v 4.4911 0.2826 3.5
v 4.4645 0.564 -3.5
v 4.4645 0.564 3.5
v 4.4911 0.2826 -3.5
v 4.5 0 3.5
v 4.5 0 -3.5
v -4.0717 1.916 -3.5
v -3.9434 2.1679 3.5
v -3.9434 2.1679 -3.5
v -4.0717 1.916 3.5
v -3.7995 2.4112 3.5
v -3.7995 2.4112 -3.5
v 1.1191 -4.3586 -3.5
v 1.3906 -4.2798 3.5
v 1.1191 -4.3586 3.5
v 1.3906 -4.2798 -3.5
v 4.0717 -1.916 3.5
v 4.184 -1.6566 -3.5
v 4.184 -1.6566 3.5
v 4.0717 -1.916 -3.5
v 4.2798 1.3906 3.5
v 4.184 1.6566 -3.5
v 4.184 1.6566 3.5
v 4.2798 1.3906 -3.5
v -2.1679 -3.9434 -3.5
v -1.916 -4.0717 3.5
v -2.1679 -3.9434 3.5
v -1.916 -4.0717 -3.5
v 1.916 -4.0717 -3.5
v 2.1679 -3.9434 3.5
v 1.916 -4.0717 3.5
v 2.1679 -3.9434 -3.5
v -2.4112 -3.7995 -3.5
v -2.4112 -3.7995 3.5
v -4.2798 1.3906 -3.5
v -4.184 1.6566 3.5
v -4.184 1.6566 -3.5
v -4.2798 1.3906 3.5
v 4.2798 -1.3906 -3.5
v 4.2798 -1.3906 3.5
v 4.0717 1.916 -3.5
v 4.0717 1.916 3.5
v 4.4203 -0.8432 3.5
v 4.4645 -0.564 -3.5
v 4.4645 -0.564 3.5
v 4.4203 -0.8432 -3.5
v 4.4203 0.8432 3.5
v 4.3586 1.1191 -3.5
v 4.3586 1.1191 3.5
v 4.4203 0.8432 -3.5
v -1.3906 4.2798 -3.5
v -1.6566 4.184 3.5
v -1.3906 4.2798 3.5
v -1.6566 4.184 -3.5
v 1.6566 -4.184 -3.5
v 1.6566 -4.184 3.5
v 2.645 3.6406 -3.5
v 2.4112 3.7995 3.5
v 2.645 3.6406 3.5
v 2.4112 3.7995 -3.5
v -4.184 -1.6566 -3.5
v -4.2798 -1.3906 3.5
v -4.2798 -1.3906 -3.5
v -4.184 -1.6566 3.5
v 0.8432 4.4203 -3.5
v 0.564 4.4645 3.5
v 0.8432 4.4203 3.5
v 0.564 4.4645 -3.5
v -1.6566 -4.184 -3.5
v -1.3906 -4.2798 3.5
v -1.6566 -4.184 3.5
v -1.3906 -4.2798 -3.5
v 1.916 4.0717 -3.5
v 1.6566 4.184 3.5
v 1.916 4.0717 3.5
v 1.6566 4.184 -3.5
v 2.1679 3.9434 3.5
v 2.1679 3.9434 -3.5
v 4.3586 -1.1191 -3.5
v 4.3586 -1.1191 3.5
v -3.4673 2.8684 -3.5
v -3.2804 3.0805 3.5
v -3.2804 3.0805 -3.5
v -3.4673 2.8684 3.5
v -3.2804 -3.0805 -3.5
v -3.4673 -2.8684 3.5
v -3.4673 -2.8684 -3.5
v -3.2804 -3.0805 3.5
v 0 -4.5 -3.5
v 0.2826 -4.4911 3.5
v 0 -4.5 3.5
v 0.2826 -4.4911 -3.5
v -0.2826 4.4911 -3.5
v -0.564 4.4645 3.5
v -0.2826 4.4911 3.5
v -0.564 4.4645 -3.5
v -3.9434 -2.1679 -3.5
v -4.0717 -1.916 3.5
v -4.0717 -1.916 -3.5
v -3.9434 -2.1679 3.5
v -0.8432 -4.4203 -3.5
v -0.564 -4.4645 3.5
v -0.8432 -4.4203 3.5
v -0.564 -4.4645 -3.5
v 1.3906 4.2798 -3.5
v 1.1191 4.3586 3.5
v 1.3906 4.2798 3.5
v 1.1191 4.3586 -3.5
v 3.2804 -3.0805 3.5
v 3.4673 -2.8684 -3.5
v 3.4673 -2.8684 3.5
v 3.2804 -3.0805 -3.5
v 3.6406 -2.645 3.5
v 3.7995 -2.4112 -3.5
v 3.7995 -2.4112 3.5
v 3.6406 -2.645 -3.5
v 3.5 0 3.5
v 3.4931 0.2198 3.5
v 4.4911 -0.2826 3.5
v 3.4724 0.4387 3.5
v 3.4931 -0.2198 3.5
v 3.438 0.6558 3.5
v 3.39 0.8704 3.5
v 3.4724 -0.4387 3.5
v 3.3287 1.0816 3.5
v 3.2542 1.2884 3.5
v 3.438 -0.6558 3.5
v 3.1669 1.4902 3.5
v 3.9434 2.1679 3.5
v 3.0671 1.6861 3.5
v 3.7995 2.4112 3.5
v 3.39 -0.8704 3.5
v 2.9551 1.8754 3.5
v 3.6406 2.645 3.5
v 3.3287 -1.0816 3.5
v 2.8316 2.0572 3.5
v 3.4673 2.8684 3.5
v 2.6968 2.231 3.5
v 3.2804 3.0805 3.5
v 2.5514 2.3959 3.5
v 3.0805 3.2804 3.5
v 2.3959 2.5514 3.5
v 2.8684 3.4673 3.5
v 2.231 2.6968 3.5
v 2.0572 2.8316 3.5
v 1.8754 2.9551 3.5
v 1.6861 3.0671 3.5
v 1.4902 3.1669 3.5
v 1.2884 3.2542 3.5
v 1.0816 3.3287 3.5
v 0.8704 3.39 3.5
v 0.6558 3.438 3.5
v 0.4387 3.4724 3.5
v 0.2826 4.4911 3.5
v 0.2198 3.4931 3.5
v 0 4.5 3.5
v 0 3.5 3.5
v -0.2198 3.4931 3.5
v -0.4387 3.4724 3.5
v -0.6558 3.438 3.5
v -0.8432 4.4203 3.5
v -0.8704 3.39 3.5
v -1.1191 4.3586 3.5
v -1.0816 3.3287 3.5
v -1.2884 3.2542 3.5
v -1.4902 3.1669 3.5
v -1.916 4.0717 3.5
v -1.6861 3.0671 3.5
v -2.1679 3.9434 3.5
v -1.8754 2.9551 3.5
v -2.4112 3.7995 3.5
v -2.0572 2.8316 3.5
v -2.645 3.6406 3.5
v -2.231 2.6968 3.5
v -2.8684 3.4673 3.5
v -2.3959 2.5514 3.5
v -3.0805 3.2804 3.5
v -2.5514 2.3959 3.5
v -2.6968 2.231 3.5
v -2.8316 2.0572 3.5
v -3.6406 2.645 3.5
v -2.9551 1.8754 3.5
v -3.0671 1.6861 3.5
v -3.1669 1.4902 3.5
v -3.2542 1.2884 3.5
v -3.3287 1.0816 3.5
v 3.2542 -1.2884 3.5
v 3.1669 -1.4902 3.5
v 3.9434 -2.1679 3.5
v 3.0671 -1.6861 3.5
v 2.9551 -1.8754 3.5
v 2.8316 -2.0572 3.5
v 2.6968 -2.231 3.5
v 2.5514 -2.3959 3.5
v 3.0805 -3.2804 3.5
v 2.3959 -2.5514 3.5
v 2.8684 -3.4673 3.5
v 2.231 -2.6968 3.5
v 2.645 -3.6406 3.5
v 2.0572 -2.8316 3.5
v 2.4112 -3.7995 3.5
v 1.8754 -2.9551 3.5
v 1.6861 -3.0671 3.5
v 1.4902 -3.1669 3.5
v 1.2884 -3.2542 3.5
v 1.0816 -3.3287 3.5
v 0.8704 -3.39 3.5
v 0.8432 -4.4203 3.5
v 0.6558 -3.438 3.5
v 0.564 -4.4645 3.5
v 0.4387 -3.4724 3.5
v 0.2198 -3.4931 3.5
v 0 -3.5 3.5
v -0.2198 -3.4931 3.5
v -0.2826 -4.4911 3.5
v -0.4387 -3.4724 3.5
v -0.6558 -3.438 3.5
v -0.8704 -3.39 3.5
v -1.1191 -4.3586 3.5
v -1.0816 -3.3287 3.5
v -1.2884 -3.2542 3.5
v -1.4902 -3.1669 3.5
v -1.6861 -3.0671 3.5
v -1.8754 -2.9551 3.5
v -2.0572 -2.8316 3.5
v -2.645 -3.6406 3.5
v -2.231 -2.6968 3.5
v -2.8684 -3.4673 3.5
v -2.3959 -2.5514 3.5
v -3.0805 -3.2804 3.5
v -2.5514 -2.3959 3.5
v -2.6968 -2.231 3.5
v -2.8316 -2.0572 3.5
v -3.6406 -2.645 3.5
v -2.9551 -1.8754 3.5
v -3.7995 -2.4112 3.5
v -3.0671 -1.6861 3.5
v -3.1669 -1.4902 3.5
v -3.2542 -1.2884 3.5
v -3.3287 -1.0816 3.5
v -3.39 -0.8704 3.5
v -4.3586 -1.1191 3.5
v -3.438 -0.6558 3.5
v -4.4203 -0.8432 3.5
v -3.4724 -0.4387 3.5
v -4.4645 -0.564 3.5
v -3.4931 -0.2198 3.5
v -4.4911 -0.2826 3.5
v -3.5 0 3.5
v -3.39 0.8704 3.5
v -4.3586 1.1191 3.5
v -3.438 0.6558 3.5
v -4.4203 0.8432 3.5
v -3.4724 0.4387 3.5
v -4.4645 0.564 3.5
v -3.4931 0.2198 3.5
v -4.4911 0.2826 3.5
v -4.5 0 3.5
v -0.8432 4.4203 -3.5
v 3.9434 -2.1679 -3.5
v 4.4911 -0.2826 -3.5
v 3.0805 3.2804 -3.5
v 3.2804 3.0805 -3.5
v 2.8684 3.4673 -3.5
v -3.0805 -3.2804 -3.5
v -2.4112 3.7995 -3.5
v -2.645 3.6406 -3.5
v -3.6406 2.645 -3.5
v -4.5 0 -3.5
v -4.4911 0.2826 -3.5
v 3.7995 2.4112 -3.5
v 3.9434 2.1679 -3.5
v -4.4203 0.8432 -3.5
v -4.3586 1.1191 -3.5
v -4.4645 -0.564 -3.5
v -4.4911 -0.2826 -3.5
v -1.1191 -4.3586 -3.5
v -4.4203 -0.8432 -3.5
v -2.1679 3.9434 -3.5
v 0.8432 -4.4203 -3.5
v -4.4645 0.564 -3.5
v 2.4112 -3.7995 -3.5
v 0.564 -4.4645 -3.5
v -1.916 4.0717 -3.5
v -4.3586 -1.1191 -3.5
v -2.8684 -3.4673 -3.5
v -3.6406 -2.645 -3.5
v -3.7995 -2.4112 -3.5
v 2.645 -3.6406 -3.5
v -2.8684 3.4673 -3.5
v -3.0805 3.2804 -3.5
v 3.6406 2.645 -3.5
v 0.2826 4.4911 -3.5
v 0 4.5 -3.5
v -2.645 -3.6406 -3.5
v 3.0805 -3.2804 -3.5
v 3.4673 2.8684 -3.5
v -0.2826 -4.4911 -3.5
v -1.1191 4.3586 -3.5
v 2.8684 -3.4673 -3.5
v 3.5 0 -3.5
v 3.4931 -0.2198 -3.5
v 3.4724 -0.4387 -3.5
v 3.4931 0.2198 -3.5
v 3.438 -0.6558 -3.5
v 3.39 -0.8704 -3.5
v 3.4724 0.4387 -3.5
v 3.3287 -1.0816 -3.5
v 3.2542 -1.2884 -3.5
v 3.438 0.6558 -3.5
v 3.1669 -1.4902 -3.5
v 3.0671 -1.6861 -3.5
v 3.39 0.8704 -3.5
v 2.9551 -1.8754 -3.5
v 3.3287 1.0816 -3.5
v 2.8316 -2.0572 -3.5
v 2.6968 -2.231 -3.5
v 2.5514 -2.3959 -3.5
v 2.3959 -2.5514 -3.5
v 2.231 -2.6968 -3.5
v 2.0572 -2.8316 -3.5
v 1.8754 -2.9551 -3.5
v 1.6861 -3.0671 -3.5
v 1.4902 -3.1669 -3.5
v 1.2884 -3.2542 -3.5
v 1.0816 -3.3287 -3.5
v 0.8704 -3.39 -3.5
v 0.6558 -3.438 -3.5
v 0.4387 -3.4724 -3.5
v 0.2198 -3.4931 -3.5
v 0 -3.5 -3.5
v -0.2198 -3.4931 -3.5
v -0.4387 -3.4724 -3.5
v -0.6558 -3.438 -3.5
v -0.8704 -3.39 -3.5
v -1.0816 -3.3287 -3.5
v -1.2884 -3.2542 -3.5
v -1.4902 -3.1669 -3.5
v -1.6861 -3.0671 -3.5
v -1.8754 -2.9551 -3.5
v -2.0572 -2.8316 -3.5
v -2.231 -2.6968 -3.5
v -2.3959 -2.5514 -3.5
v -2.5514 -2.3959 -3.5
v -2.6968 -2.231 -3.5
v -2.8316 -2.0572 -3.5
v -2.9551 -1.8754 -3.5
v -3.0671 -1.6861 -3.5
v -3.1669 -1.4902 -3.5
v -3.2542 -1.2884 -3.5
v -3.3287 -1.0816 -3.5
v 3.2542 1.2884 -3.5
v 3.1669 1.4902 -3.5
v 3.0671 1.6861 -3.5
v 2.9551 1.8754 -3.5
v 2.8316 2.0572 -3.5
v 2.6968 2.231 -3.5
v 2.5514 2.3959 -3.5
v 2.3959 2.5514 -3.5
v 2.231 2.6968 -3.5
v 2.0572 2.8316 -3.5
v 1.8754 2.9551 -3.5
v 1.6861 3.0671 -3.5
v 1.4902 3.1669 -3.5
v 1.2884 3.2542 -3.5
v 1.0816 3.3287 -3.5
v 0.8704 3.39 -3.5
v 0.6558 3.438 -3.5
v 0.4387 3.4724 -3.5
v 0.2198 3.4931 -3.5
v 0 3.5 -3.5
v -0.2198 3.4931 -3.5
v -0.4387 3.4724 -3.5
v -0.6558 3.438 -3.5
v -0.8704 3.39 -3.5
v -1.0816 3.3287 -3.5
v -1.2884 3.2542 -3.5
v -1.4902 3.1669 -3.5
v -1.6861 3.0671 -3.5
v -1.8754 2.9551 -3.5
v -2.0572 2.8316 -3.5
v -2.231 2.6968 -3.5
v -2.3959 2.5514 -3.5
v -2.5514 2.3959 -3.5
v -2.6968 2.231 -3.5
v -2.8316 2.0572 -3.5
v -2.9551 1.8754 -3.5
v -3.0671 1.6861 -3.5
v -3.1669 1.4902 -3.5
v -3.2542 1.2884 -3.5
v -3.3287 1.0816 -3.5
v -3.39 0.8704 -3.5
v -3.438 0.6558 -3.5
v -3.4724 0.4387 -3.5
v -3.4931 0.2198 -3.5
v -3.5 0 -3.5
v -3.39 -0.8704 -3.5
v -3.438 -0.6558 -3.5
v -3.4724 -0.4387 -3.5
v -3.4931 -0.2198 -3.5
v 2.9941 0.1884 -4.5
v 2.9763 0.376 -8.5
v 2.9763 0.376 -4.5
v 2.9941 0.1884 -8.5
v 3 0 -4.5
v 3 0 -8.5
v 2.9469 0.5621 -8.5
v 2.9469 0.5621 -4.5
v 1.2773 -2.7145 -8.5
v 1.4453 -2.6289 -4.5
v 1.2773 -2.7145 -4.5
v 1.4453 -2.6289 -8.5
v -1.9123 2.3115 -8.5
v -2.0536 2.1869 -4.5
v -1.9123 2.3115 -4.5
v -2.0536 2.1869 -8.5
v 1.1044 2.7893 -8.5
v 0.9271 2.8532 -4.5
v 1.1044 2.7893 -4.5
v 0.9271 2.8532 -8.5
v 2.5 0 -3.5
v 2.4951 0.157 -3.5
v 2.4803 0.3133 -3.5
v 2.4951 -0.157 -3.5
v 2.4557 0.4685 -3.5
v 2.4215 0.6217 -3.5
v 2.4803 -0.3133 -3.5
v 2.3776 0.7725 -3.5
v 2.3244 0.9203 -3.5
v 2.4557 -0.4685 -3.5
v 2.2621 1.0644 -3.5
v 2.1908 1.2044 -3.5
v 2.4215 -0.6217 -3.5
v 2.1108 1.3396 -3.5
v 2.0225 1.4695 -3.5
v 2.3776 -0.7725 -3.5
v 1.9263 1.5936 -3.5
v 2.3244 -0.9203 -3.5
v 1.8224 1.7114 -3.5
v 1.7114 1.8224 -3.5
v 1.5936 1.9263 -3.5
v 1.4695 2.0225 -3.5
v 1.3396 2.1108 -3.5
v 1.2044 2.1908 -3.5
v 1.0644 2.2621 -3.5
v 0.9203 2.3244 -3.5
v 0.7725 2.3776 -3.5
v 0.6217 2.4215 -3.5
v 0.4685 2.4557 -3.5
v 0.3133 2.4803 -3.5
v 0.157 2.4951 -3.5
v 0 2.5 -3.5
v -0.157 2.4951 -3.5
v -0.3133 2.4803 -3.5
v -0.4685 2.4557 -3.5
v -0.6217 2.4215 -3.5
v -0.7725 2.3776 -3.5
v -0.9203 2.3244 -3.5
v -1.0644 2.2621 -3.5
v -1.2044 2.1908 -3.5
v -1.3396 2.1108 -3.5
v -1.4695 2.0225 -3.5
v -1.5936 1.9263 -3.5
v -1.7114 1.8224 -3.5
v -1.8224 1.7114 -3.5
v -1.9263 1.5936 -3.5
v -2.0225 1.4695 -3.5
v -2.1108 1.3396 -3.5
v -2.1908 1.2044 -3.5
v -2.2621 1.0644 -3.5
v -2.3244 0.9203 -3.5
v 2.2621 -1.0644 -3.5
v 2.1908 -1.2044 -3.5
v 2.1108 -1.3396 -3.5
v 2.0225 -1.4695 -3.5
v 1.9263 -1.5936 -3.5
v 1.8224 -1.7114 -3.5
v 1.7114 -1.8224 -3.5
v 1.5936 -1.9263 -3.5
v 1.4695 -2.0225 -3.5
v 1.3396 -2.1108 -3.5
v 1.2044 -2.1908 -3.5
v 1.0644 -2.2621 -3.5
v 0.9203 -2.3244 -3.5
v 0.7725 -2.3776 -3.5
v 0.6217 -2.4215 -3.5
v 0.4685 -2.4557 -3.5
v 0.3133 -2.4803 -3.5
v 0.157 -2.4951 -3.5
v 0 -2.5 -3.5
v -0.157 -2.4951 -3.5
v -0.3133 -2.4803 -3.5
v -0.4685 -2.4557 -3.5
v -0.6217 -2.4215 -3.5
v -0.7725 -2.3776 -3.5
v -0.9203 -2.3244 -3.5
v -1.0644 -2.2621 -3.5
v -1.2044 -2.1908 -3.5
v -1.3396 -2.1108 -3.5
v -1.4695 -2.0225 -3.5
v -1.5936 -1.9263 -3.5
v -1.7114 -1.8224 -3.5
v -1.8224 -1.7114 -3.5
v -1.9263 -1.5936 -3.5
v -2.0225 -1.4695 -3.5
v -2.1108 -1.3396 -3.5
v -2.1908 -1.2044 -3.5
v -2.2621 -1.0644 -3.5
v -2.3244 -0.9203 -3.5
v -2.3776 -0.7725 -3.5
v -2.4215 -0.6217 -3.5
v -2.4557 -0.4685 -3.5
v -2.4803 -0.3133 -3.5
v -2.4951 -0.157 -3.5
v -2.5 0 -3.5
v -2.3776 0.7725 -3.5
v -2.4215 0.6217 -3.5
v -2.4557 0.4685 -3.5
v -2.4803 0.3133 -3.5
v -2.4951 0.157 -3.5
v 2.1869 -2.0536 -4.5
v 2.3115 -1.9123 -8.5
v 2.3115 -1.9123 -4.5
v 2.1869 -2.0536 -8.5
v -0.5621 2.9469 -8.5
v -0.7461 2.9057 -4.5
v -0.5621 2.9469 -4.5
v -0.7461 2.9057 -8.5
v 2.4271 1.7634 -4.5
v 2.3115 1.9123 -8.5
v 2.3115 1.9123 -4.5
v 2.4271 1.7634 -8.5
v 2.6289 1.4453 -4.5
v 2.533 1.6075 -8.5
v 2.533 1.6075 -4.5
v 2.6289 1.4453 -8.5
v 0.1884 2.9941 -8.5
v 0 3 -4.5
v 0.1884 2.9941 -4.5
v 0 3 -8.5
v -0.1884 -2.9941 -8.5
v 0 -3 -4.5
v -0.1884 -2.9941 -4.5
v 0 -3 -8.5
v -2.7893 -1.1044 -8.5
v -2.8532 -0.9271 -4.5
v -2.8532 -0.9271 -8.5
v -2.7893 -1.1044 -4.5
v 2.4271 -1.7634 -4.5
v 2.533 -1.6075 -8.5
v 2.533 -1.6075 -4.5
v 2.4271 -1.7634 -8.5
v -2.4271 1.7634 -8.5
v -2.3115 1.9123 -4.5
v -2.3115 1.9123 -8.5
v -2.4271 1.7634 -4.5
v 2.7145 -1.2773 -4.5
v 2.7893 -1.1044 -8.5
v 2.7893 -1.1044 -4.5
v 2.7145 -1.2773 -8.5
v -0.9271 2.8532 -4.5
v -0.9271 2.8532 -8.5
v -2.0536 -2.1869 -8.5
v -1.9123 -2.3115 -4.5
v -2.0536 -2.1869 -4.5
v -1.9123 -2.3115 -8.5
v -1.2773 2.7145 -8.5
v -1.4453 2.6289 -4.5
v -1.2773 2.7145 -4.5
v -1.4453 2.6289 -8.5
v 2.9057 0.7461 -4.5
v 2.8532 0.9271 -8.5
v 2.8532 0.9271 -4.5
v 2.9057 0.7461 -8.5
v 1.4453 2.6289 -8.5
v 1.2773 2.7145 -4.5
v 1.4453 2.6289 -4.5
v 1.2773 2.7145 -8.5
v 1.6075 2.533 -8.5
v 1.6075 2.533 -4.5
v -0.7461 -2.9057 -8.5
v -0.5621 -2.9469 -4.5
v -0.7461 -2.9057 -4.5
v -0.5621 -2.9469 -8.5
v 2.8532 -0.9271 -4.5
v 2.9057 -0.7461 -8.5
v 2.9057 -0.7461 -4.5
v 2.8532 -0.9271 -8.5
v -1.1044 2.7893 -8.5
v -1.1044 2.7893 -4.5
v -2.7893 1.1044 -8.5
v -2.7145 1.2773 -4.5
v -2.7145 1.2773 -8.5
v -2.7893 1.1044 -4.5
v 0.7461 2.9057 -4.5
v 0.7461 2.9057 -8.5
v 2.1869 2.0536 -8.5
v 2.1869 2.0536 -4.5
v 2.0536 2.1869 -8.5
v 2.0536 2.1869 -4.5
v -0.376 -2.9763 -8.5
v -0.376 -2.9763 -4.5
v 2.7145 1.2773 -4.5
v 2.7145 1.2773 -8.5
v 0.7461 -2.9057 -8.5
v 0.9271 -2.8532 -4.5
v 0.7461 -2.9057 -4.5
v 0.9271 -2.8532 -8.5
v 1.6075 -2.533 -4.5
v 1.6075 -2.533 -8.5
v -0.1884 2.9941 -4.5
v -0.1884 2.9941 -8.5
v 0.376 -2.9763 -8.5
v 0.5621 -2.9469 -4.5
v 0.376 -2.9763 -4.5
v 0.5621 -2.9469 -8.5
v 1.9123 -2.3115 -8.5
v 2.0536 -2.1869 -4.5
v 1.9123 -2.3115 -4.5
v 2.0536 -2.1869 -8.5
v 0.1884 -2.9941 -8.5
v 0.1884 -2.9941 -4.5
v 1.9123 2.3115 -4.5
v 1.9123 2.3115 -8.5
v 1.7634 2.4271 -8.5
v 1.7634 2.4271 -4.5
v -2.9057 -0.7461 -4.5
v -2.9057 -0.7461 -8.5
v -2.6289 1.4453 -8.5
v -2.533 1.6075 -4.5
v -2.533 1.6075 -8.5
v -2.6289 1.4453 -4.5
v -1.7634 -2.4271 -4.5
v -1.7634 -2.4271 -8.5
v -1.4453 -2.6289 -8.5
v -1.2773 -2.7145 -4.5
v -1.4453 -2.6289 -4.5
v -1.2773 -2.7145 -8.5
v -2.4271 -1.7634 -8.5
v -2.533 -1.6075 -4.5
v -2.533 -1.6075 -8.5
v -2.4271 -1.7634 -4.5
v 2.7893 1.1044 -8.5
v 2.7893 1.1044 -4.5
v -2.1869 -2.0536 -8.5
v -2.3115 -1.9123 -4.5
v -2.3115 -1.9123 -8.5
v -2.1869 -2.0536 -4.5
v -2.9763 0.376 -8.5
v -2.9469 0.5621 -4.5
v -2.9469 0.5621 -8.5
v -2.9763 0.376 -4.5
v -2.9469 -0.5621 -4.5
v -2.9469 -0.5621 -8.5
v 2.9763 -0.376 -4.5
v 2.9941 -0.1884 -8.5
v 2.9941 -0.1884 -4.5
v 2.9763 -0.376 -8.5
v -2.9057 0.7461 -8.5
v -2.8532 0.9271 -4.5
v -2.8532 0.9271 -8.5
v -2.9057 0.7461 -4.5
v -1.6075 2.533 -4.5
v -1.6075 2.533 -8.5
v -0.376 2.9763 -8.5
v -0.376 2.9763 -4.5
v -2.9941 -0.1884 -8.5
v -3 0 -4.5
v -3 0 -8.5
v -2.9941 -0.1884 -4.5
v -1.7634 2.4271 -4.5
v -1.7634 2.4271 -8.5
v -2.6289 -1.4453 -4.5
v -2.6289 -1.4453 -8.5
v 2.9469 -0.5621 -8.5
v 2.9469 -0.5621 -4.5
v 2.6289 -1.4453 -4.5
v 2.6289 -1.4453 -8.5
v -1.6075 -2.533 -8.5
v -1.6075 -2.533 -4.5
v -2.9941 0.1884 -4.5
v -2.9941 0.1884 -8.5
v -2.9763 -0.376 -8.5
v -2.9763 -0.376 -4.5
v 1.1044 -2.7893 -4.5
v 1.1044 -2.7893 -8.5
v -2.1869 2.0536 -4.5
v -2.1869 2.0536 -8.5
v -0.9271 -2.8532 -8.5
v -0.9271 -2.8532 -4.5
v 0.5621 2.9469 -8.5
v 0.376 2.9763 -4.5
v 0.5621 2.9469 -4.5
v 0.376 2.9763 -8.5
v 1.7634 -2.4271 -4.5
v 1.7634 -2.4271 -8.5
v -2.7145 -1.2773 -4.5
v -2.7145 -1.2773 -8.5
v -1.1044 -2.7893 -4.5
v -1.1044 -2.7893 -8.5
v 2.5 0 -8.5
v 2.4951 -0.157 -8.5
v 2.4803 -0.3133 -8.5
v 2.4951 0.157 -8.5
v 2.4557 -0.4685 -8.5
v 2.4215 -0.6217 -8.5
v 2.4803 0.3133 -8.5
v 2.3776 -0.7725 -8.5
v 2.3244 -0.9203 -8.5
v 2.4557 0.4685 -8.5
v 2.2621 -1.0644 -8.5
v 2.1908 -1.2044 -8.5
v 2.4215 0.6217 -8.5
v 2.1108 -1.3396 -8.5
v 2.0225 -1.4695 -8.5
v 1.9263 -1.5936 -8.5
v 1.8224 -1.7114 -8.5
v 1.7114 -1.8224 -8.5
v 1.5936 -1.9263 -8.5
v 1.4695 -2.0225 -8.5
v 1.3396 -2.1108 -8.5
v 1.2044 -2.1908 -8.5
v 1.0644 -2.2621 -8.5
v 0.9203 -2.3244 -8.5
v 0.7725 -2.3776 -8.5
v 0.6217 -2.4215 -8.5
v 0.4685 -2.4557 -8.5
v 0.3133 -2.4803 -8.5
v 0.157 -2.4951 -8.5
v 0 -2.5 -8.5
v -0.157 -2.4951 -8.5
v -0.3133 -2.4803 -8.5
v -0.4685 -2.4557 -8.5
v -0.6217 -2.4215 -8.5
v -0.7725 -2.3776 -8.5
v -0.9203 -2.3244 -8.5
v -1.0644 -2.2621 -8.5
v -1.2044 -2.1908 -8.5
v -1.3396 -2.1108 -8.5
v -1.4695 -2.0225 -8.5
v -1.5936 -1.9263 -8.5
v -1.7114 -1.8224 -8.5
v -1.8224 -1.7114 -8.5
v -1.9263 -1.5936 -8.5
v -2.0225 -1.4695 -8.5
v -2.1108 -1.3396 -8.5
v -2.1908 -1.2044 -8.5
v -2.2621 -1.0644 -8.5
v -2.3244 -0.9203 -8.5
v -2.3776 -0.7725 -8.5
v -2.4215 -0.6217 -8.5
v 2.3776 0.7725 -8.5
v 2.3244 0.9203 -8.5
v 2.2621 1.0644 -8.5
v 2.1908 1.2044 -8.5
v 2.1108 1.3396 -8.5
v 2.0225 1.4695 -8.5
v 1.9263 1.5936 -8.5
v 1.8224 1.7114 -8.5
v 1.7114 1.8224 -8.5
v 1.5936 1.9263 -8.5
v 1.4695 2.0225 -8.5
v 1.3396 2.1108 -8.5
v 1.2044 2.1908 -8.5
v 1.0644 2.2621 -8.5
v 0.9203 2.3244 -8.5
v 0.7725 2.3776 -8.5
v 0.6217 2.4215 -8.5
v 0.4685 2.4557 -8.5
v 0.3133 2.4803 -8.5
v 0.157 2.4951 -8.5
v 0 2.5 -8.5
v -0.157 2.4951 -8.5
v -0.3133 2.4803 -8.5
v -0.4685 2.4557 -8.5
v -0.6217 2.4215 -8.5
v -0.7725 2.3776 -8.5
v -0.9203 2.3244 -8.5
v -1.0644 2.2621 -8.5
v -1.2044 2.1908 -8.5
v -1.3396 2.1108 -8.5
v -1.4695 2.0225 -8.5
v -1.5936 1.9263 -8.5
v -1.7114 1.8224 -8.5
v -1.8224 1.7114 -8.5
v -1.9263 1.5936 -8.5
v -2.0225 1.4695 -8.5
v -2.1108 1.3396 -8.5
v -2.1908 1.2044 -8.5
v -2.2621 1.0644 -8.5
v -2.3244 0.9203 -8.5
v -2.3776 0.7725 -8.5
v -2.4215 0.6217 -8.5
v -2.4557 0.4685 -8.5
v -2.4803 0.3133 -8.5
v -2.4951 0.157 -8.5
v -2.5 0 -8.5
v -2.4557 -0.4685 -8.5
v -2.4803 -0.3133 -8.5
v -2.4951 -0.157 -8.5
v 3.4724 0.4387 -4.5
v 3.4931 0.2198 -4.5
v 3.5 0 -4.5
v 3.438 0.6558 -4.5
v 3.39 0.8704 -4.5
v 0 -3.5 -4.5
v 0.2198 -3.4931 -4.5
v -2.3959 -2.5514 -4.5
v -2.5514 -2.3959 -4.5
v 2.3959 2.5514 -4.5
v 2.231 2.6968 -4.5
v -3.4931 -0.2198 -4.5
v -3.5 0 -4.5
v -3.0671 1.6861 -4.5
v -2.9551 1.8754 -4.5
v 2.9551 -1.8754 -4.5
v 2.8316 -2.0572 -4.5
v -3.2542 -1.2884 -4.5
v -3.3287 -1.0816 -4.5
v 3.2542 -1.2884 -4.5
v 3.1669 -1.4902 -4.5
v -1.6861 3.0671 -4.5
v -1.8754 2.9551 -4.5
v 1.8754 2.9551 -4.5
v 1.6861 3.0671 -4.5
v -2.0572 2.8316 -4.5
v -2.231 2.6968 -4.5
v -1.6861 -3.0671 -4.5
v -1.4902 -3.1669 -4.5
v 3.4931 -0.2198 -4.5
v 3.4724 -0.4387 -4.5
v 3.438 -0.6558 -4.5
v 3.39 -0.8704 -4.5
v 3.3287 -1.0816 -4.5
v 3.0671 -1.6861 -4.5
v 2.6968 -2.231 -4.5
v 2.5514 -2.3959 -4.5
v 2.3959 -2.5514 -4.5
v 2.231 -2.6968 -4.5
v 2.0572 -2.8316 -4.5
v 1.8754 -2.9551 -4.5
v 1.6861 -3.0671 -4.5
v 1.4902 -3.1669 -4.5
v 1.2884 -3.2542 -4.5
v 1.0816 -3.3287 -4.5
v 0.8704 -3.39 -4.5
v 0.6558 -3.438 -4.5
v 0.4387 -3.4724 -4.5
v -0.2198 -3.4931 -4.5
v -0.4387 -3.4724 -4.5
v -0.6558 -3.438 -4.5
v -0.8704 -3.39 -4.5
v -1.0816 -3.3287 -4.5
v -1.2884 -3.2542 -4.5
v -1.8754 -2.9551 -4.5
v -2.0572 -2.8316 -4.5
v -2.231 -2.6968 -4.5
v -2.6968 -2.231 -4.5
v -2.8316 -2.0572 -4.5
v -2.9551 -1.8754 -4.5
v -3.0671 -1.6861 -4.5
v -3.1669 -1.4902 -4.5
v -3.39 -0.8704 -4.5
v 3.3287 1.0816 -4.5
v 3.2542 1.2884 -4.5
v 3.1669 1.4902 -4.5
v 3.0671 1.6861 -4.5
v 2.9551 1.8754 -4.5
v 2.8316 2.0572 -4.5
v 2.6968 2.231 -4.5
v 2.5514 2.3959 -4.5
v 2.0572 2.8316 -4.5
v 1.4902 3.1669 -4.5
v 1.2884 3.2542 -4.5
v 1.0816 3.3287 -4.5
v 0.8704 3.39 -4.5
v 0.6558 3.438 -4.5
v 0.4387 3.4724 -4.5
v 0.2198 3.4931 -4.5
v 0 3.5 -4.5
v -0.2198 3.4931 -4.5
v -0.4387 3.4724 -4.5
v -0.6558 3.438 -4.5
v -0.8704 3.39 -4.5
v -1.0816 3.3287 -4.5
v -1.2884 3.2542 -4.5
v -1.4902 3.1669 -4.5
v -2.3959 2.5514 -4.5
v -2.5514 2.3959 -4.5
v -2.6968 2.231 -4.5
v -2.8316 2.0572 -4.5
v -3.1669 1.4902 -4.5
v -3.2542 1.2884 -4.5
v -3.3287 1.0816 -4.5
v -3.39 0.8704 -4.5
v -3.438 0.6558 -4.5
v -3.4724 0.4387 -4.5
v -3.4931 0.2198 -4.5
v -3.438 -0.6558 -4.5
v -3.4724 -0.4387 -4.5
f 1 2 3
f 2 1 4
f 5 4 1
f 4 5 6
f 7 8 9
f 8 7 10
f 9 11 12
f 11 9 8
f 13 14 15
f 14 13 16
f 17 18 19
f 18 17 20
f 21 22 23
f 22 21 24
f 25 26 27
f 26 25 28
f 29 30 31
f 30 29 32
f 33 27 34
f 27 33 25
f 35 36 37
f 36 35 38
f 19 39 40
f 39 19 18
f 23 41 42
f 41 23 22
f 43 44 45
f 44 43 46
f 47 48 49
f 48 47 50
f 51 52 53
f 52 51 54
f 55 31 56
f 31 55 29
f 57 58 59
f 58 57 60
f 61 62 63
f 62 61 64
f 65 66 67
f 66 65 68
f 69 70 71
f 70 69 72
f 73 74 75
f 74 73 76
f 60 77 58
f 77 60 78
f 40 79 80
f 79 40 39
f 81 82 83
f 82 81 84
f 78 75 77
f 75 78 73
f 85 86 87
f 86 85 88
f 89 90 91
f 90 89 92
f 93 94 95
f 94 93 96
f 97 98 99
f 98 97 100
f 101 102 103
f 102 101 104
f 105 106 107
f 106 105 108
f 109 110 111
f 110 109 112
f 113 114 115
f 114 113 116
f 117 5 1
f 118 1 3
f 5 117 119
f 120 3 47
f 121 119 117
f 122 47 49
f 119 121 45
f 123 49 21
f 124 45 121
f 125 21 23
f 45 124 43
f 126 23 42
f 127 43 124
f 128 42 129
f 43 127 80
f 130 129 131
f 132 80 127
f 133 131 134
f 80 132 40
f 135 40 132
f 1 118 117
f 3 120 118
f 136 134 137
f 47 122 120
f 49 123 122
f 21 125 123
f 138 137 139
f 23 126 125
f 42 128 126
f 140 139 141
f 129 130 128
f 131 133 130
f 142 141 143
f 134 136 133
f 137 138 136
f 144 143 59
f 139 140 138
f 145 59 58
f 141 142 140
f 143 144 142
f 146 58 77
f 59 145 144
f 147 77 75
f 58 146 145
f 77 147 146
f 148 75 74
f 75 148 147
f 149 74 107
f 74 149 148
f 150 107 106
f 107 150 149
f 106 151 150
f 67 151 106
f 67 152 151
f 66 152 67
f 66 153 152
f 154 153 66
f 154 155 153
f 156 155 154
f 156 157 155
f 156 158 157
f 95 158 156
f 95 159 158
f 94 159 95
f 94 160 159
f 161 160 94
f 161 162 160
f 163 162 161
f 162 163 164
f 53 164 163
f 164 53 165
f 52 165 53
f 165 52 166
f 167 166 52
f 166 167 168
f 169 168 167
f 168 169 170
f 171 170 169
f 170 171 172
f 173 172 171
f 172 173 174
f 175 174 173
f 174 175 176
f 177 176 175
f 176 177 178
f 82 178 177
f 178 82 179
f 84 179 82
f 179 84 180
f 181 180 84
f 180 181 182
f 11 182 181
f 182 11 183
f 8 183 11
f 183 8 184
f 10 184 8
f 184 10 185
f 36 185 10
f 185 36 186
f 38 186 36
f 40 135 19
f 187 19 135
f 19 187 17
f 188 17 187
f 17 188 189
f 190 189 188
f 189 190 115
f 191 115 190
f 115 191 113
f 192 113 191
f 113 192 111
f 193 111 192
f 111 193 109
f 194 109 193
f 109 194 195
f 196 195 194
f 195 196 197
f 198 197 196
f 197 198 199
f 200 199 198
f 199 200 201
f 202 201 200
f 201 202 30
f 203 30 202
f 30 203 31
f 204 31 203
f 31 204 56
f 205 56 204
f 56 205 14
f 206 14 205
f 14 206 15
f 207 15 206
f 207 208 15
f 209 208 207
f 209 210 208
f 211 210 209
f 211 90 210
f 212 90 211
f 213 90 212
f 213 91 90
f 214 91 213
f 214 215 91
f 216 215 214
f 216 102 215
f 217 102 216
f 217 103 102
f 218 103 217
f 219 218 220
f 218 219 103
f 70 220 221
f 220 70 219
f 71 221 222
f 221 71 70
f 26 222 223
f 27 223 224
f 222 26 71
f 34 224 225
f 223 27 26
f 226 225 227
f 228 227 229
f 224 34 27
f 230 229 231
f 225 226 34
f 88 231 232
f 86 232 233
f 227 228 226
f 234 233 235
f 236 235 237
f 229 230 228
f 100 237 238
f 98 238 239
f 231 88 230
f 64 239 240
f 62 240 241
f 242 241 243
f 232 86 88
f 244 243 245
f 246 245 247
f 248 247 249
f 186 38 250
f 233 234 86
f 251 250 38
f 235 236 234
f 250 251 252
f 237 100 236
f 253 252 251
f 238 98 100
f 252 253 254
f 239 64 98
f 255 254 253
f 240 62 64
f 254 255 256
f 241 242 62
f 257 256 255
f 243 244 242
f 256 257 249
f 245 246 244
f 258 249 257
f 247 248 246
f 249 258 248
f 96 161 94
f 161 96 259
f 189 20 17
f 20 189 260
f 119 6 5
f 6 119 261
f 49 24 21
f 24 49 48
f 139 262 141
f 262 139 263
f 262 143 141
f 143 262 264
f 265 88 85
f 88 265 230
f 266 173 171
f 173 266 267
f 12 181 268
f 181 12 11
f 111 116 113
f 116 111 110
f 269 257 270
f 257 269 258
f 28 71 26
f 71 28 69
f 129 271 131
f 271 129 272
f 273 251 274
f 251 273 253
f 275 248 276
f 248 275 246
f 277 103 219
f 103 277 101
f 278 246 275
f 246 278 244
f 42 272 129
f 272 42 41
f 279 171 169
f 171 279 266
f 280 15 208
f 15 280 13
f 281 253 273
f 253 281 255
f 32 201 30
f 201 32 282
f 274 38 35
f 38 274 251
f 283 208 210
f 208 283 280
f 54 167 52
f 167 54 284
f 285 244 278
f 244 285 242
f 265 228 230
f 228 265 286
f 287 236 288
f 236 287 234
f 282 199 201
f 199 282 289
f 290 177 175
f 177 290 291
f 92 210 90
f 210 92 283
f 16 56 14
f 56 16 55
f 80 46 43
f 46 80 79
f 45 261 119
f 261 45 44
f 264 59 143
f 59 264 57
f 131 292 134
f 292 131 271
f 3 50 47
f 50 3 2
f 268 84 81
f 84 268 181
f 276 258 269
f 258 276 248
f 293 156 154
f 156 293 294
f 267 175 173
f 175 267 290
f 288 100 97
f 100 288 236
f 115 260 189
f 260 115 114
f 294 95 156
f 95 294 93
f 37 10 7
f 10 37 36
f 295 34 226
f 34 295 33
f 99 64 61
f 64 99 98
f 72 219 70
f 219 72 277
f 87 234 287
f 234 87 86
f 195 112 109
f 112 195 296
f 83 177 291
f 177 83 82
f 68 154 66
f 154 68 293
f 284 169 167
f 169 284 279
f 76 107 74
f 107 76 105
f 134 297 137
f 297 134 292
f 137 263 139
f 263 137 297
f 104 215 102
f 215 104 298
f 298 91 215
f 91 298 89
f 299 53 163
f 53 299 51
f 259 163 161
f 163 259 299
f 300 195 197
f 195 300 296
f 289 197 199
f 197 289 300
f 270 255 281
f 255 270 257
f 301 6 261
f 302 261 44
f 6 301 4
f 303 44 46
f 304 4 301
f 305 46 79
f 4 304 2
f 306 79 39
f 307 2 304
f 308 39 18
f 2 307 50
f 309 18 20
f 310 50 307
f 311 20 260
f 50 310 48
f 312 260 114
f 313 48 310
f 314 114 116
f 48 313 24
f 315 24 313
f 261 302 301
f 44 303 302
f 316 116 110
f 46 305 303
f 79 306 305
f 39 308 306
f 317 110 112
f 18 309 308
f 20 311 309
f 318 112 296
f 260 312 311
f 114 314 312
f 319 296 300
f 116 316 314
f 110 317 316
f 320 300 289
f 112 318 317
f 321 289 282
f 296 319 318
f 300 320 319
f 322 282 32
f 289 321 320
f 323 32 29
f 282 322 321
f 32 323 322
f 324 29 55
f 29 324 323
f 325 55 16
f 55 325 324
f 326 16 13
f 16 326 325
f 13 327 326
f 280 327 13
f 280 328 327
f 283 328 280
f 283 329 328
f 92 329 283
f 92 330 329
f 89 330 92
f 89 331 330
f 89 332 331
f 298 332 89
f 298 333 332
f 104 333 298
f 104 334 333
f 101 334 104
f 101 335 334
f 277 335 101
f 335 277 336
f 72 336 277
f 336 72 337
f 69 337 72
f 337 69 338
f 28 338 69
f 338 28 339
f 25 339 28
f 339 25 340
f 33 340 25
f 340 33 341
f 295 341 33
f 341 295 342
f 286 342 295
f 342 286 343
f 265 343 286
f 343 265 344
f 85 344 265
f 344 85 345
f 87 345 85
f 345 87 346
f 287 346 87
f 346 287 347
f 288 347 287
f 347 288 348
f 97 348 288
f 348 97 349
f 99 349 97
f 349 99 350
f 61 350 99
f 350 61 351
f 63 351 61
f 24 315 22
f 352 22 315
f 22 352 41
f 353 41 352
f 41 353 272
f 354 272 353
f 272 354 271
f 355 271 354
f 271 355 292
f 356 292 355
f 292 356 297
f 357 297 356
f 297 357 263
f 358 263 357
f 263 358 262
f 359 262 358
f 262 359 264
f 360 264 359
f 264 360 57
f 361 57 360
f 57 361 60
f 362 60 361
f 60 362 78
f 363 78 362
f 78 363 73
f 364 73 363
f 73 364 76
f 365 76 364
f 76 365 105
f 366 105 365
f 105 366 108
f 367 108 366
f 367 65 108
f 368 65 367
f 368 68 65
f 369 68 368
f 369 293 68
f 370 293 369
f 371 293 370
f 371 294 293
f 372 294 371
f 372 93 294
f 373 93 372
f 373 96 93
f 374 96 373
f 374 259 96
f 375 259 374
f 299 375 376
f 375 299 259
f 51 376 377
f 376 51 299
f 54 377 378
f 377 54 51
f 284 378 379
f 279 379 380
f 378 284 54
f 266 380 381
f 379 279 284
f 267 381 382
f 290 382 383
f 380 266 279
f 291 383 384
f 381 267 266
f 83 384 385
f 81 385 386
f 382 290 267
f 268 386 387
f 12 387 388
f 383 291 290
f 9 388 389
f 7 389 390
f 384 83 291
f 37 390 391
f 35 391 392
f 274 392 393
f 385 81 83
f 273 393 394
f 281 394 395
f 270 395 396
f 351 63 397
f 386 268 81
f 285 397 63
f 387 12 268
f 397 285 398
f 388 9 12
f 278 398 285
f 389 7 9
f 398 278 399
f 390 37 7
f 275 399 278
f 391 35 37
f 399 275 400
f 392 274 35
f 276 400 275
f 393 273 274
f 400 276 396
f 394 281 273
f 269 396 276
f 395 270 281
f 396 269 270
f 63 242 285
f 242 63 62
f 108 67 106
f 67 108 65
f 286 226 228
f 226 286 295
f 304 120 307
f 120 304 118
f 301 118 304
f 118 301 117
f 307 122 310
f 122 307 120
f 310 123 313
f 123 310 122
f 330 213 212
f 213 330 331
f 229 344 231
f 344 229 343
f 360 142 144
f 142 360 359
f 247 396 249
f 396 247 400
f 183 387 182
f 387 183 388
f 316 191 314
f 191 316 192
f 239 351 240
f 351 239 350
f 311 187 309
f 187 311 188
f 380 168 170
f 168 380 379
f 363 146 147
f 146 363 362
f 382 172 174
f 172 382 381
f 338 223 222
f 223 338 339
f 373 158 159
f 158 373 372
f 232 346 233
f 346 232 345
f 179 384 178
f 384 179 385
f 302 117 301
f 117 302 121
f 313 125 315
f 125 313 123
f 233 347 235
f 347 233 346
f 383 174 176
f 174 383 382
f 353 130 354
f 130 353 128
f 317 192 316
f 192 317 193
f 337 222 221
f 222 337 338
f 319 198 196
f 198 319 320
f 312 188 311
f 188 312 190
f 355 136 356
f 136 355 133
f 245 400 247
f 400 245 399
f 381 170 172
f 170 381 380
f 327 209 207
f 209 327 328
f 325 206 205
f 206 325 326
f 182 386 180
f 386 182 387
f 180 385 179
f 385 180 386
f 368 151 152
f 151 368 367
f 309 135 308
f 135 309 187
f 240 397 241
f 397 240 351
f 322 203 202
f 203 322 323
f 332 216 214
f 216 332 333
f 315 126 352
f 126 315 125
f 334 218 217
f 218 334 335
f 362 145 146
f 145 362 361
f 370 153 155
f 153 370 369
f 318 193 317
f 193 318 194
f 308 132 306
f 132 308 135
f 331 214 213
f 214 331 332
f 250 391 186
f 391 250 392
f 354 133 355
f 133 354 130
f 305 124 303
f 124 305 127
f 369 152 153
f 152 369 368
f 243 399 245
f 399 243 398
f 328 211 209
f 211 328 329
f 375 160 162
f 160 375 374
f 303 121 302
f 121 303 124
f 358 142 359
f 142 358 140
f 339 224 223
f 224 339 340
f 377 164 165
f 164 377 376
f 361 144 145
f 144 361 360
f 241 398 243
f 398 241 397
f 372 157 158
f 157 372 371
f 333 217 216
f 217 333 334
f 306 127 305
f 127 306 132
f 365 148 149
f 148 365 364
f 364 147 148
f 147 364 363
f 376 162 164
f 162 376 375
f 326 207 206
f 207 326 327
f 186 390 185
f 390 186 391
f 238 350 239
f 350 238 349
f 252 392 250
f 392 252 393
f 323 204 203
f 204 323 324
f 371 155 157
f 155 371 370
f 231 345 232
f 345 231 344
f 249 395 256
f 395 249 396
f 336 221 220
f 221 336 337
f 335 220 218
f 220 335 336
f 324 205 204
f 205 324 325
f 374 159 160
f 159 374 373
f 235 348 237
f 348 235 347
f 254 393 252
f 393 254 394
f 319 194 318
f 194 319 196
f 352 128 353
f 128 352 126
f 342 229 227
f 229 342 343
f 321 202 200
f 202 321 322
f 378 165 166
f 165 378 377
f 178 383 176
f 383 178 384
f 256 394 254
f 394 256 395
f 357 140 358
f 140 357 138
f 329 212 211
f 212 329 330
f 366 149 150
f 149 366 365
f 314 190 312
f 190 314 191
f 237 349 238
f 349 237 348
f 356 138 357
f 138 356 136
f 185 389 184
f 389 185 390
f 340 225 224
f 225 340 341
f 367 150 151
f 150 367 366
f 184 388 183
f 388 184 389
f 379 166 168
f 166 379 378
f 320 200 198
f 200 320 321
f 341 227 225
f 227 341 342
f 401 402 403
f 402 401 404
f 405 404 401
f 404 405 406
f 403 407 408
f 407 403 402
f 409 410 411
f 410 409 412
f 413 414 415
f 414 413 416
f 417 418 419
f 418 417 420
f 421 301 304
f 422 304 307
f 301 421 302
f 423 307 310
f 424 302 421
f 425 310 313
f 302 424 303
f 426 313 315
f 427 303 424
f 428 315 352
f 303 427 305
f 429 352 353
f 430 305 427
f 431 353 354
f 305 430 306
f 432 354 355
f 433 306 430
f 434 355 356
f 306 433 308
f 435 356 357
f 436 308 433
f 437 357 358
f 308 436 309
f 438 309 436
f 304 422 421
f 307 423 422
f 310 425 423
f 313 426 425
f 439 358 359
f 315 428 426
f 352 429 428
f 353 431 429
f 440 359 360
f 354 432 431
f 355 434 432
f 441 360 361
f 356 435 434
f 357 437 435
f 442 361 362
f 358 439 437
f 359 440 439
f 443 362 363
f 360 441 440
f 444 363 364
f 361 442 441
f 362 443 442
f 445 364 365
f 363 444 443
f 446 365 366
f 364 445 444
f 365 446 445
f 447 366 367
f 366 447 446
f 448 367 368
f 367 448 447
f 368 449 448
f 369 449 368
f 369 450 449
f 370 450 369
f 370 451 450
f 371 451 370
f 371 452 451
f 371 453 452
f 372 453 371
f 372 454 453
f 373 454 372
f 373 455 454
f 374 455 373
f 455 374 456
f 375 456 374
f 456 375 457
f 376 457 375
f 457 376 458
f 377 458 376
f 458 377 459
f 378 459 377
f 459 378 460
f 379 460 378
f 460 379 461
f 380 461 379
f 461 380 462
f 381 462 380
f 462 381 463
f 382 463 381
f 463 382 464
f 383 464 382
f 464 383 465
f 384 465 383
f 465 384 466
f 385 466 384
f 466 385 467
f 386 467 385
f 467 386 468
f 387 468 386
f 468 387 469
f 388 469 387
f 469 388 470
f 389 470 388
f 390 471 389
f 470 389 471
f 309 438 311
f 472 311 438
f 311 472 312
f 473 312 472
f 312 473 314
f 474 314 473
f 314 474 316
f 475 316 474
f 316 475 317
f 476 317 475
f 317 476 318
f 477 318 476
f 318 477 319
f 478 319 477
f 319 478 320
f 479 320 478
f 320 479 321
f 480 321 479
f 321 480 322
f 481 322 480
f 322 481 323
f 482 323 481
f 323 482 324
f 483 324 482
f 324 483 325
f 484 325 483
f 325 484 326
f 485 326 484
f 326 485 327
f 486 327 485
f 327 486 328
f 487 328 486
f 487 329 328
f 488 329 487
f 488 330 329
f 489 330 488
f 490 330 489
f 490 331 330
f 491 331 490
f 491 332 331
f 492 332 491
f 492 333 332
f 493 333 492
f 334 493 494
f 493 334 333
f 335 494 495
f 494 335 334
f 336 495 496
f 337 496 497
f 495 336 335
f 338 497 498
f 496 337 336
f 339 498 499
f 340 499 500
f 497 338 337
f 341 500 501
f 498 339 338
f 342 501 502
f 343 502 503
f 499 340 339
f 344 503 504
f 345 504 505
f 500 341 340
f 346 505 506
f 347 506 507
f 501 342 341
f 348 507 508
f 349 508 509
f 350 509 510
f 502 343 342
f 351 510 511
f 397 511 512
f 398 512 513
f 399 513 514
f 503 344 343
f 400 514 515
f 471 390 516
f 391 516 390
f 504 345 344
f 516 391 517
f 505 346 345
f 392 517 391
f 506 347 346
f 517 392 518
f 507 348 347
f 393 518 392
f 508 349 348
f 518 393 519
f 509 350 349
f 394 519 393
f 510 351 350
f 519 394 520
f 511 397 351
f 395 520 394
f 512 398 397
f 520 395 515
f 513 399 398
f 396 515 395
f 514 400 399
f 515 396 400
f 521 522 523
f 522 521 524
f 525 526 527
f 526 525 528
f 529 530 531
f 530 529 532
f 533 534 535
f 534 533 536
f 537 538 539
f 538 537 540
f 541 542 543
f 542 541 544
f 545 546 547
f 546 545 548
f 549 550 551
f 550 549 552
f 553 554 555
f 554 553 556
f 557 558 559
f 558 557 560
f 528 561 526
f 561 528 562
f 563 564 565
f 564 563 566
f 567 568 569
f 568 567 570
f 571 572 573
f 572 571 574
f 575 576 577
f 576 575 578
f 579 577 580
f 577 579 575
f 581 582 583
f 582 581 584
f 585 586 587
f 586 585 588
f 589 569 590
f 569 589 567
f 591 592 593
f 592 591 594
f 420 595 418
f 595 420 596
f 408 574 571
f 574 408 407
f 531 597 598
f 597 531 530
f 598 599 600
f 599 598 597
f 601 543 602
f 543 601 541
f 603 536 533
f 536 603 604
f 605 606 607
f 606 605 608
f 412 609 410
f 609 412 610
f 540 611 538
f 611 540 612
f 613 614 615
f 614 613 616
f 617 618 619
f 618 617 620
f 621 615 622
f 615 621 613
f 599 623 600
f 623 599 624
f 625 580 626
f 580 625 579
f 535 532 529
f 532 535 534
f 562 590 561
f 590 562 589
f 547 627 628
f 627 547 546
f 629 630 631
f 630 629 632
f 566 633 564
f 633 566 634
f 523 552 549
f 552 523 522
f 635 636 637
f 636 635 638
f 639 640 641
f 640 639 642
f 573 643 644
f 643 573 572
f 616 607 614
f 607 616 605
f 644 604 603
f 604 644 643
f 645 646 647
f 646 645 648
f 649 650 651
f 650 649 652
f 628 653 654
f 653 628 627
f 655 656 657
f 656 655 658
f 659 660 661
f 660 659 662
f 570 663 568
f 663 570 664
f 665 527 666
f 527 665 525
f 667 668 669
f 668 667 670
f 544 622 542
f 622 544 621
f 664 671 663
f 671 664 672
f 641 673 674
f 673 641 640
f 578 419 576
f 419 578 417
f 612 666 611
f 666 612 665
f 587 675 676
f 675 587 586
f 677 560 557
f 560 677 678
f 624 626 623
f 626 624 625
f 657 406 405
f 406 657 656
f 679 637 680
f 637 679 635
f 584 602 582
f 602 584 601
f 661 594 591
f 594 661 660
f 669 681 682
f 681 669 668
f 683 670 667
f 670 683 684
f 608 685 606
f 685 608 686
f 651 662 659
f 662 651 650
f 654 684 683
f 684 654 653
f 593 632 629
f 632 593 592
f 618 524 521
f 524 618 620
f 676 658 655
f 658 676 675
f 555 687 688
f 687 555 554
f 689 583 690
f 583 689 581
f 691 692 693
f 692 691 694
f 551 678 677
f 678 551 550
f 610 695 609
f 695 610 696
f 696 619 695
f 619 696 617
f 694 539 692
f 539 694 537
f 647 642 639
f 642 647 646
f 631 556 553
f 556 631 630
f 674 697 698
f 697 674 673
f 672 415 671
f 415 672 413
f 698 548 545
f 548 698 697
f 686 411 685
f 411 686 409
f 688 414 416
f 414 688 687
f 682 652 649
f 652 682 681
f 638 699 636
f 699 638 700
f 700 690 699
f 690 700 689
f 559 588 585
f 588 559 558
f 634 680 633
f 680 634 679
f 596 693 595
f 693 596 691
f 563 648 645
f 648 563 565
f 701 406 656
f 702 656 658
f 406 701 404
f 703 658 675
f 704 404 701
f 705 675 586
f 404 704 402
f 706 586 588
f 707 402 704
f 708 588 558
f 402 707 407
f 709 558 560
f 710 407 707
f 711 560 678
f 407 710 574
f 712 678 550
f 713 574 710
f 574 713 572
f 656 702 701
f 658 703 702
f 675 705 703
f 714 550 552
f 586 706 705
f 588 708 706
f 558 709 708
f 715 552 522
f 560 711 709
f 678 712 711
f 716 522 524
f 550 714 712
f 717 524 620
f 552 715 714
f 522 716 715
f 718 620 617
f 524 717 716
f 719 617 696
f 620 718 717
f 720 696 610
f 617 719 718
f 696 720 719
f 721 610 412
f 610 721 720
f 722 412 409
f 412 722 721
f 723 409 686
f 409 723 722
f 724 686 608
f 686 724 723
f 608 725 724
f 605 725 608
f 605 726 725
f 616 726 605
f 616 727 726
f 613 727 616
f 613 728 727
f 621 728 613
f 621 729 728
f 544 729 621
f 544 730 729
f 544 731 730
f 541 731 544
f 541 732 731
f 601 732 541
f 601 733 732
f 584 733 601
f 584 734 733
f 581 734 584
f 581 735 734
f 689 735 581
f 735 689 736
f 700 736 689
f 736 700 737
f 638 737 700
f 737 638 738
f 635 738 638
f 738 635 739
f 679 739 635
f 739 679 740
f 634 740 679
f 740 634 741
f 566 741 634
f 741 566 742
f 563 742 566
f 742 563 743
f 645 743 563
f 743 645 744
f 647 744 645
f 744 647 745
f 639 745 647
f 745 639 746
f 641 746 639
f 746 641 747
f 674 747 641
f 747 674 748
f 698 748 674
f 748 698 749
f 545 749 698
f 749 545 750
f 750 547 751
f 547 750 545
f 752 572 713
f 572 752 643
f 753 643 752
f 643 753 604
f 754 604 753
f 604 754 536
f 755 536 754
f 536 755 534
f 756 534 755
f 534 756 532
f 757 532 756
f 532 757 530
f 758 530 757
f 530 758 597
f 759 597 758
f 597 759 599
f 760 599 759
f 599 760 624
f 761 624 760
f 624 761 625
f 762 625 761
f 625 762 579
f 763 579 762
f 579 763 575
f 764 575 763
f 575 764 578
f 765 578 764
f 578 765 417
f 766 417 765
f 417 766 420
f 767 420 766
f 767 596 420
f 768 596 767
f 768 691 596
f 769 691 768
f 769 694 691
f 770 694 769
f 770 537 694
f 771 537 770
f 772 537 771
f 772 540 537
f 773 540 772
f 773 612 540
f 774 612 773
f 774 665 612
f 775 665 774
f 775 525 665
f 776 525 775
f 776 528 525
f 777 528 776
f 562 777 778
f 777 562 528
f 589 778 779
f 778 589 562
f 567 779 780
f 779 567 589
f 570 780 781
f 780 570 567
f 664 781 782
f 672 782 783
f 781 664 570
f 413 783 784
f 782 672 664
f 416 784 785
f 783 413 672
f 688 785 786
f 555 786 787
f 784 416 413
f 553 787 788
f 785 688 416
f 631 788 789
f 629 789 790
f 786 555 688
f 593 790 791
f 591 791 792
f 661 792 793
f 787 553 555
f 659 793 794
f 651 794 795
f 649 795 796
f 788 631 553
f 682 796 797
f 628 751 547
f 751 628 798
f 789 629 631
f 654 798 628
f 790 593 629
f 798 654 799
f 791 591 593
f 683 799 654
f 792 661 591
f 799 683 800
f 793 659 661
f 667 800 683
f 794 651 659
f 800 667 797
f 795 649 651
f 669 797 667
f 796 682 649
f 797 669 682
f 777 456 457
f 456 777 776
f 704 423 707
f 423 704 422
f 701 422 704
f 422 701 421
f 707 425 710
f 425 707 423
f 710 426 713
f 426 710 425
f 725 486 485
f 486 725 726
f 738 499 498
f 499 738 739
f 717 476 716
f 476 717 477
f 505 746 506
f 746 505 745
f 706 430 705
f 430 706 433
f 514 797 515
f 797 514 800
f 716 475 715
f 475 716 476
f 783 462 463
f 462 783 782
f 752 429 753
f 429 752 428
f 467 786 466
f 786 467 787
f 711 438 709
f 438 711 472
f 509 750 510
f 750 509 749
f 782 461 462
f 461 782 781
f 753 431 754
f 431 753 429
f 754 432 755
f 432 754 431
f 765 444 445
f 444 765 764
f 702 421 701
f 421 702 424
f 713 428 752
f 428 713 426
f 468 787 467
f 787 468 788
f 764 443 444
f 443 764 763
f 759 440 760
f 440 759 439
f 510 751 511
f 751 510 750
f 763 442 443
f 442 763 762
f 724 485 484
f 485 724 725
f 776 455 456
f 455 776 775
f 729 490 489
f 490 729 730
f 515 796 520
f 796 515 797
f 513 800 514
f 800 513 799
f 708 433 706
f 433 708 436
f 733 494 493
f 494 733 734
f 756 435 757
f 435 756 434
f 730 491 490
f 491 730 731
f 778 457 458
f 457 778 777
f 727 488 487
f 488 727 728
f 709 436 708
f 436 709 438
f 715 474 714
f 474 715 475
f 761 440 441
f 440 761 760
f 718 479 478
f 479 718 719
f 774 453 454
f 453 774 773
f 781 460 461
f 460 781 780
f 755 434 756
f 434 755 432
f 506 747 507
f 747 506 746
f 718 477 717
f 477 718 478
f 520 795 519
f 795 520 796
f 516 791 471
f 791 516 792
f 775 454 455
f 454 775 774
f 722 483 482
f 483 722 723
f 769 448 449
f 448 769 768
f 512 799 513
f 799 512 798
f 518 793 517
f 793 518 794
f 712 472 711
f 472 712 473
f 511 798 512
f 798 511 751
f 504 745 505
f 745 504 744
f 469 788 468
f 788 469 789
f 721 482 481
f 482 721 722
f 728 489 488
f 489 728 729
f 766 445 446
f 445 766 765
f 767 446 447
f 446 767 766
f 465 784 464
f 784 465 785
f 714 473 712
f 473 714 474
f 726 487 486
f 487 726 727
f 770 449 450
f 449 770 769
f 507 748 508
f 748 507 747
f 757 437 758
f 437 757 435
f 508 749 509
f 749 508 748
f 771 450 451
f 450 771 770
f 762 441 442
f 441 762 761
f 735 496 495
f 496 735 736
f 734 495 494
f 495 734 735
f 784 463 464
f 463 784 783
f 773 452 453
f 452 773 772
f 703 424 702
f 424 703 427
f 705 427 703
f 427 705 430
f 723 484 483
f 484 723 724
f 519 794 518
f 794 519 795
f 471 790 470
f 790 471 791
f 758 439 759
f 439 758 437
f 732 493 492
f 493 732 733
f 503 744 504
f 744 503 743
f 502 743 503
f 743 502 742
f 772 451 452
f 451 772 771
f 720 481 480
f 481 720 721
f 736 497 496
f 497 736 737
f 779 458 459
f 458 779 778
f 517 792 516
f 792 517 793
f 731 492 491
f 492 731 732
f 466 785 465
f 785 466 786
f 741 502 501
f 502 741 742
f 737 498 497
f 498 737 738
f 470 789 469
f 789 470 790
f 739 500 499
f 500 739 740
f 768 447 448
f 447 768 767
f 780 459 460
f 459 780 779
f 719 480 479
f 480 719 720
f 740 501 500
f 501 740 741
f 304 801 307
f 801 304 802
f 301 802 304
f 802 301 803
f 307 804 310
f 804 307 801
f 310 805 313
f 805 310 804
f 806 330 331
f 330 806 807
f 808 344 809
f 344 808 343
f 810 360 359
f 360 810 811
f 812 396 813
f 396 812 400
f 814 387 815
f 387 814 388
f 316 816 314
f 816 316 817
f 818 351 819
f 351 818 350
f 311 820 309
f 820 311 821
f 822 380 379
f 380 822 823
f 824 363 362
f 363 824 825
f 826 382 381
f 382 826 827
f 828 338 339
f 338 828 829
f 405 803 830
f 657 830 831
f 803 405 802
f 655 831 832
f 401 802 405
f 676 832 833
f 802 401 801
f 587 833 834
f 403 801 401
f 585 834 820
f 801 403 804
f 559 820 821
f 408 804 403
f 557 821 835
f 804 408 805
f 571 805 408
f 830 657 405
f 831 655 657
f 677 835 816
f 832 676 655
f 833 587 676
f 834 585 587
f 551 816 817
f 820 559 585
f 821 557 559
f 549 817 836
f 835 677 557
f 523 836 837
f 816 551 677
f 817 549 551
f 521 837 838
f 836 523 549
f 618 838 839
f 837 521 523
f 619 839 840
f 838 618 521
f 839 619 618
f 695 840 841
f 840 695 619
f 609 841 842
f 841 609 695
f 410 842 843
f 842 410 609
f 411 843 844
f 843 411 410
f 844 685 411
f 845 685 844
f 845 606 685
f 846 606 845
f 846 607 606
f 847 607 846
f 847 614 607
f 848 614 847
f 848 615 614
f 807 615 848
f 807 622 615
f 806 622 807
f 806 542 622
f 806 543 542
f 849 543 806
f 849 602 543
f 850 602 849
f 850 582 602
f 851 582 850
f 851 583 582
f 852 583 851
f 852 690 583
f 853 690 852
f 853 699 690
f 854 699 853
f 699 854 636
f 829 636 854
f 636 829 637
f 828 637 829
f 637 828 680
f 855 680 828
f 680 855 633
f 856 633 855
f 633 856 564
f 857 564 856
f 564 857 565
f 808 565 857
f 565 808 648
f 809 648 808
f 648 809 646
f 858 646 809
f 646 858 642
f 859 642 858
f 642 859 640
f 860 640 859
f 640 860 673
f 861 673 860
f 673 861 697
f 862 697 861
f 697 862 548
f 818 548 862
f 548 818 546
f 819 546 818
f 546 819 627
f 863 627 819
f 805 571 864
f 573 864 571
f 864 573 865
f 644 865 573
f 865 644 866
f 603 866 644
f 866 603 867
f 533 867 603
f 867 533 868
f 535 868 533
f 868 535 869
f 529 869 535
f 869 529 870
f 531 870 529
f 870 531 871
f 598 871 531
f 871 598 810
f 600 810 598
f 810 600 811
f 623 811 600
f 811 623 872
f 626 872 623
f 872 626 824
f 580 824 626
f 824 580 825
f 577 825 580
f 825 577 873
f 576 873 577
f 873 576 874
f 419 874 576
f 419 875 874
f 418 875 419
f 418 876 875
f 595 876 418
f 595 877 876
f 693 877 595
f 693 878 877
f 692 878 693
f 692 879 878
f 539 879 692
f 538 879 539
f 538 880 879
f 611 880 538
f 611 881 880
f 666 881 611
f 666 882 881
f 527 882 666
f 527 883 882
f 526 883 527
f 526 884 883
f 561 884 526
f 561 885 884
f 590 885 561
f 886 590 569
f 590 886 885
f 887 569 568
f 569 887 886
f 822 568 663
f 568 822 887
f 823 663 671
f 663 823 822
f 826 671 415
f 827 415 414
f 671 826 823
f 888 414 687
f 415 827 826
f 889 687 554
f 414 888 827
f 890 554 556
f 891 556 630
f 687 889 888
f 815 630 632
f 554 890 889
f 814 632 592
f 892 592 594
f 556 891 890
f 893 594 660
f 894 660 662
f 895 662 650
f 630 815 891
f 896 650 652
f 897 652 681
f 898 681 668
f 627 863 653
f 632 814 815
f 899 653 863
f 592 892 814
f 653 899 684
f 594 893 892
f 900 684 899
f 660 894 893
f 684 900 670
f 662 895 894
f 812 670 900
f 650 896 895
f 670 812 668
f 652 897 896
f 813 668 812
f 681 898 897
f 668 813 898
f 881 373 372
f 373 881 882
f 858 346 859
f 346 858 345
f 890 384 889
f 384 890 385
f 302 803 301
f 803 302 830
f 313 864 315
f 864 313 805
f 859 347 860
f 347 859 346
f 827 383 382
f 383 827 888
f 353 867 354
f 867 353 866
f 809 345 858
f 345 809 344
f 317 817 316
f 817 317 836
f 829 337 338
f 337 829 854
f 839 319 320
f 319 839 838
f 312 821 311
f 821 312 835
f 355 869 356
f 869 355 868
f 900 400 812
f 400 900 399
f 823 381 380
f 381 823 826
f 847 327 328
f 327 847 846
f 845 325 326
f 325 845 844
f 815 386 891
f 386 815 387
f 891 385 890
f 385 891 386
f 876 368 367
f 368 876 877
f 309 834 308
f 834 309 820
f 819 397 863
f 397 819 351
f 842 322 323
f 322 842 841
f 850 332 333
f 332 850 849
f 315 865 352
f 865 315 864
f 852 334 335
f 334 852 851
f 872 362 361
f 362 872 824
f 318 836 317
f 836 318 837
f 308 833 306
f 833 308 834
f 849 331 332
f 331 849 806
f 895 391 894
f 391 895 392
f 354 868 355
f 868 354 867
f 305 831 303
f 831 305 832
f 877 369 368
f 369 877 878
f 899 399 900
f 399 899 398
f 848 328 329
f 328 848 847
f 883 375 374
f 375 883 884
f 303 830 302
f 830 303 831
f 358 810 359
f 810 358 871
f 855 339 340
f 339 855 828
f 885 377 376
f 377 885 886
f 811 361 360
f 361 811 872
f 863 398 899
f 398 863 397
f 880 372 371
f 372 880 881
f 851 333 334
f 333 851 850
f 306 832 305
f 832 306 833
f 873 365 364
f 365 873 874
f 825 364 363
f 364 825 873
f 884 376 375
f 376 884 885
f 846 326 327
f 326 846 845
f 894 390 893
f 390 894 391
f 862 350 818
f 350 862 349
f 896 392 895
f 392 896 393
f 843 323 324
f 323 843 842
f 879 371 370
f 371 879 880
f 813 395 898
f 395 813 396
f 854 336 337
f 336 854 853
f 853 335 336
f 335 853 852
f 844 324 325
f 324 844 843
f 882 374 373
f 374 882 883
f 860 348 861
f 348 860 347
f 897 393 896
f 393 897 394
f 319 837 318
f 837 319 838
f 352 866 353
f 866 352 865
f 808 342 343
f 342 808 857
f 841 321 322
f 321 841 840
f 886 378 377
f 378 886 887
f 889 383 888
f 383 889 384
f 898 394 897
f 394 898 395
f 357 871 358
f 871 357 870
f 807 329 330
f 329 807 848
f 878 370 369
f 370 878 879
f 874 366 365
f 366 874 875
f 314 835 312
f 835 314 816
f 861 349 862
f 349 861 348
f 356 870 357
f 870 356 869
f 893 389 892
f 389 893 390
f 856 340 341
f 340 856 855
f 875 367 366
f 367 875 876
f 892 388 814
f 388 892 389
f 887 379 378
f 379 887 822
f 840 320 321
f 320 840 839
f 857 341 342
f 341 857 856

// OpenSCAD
// Ankur Gupta
// Feb 2017
// github.com/agupta231

// Setup faces
$fn = 100;

// Parameters
straw_diameter = 5;
straw_connector_bottom_height = 5;
straw_connector_top_height = 3;
straw_connector_thicc = 1;
valve_diameter = 7;
valve_thickness = 2;
ball_diameter = 6;
ball_travel_distance = 1;
valve_connector_height = 2;
valve_height = ball_diameter + ball_travel_distance;

// Valve and straw connector
union() {
    difference() {
      cylinder(d=valve_diameter + valve_thickness, h=valve_height, center=true);
      cylinder(d=valve_diameter, h=valve_height + 5, center=true);
    }

    translate([0, 0, -valve_height / 2 - straw_connector_bottom_height / 2]) {
      difference() {
        cylinder(d=straw_diameter + straw_connector_thicc, h=straw_connector_bottom_height, center=true);
        cylinder(d=straw_diameter, h=straw_connector_bottom_height + 1, center=true);
      }
    }

    translate([0, 0, -valve_height / 2 - 0.5]) {
        difference() {
            cylinder(d=valve_diameter, h=1, center=true);
            cylinder(d=straw_diameter + straw_connector_thicc, h=1.1, center=true);
        }
    }
}
